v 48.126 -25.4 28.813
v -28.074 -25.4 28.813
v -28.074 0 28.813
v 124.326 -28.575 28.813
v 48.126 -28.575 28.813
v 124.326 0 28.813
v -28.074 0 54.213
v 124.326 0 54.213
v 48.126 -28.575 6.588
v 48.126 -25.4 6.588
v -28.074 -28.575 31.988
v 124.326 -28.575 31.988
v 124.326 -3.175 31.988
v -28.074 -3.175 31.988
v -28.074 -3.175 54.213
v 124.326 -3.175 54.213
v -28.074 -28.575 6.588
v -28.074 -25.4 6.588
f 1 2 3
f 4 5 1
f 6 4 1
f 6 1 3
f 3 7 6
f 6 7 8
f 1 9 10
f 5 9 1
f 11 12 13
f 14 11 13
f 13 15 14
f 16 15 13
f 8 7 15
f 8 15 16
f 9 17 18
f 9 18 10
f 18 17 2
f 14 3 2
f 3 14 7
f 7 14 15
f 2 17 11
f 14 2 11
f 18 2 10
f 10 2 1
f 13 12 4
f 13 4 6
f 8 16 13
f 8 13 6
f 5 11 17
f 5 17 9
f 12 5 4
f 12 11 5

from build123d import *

# Parameters (mm, degrees)
F0_W     = 152.4
F0_H     = 25.4
F1_DEPTH = 3.175
F2_W     = 25.4
F2_H     = 3.175
F3_DEPTH = 152.4
F4_W     = 76.2
F4_H     = 22.225
F5_DEPTH = 3.175


# Not quite as in the source:
# - a length typed as a fraction of an inch, garbled in the dataset ("3 / 203.2 mm" for 3/8 in), is restored


with BuildPart() as f1:
    # F0 (on Front) → F1 (new body)
    with BuildSketch(Plane.XZ):
        with Locations((48.1263138257, 41.5133684874)):
            Rectangle(F0_W, F0_H)
    extrude(amount=F1_DEPTH)

    # F2 (on face) → F3 (join)
    with BuildSketch(Plane.YZ.offset(124.3263138257)):
        with Locations((-15.875, 30.4008684874)):
            Rectangle(F2_W, F2_H)
    extrude(amount=-F3_DEPTH)

    # F4 (on face) → F5 (join)
    with BuildSketch(Plane.XZ.offset(28.575)):
        with Locations((10.0263138257, 17.7008684874)):
            Rectangle(F4_W, F4_H)
    extrude(amount=-F5_DEPTH)


solid = f1.part
